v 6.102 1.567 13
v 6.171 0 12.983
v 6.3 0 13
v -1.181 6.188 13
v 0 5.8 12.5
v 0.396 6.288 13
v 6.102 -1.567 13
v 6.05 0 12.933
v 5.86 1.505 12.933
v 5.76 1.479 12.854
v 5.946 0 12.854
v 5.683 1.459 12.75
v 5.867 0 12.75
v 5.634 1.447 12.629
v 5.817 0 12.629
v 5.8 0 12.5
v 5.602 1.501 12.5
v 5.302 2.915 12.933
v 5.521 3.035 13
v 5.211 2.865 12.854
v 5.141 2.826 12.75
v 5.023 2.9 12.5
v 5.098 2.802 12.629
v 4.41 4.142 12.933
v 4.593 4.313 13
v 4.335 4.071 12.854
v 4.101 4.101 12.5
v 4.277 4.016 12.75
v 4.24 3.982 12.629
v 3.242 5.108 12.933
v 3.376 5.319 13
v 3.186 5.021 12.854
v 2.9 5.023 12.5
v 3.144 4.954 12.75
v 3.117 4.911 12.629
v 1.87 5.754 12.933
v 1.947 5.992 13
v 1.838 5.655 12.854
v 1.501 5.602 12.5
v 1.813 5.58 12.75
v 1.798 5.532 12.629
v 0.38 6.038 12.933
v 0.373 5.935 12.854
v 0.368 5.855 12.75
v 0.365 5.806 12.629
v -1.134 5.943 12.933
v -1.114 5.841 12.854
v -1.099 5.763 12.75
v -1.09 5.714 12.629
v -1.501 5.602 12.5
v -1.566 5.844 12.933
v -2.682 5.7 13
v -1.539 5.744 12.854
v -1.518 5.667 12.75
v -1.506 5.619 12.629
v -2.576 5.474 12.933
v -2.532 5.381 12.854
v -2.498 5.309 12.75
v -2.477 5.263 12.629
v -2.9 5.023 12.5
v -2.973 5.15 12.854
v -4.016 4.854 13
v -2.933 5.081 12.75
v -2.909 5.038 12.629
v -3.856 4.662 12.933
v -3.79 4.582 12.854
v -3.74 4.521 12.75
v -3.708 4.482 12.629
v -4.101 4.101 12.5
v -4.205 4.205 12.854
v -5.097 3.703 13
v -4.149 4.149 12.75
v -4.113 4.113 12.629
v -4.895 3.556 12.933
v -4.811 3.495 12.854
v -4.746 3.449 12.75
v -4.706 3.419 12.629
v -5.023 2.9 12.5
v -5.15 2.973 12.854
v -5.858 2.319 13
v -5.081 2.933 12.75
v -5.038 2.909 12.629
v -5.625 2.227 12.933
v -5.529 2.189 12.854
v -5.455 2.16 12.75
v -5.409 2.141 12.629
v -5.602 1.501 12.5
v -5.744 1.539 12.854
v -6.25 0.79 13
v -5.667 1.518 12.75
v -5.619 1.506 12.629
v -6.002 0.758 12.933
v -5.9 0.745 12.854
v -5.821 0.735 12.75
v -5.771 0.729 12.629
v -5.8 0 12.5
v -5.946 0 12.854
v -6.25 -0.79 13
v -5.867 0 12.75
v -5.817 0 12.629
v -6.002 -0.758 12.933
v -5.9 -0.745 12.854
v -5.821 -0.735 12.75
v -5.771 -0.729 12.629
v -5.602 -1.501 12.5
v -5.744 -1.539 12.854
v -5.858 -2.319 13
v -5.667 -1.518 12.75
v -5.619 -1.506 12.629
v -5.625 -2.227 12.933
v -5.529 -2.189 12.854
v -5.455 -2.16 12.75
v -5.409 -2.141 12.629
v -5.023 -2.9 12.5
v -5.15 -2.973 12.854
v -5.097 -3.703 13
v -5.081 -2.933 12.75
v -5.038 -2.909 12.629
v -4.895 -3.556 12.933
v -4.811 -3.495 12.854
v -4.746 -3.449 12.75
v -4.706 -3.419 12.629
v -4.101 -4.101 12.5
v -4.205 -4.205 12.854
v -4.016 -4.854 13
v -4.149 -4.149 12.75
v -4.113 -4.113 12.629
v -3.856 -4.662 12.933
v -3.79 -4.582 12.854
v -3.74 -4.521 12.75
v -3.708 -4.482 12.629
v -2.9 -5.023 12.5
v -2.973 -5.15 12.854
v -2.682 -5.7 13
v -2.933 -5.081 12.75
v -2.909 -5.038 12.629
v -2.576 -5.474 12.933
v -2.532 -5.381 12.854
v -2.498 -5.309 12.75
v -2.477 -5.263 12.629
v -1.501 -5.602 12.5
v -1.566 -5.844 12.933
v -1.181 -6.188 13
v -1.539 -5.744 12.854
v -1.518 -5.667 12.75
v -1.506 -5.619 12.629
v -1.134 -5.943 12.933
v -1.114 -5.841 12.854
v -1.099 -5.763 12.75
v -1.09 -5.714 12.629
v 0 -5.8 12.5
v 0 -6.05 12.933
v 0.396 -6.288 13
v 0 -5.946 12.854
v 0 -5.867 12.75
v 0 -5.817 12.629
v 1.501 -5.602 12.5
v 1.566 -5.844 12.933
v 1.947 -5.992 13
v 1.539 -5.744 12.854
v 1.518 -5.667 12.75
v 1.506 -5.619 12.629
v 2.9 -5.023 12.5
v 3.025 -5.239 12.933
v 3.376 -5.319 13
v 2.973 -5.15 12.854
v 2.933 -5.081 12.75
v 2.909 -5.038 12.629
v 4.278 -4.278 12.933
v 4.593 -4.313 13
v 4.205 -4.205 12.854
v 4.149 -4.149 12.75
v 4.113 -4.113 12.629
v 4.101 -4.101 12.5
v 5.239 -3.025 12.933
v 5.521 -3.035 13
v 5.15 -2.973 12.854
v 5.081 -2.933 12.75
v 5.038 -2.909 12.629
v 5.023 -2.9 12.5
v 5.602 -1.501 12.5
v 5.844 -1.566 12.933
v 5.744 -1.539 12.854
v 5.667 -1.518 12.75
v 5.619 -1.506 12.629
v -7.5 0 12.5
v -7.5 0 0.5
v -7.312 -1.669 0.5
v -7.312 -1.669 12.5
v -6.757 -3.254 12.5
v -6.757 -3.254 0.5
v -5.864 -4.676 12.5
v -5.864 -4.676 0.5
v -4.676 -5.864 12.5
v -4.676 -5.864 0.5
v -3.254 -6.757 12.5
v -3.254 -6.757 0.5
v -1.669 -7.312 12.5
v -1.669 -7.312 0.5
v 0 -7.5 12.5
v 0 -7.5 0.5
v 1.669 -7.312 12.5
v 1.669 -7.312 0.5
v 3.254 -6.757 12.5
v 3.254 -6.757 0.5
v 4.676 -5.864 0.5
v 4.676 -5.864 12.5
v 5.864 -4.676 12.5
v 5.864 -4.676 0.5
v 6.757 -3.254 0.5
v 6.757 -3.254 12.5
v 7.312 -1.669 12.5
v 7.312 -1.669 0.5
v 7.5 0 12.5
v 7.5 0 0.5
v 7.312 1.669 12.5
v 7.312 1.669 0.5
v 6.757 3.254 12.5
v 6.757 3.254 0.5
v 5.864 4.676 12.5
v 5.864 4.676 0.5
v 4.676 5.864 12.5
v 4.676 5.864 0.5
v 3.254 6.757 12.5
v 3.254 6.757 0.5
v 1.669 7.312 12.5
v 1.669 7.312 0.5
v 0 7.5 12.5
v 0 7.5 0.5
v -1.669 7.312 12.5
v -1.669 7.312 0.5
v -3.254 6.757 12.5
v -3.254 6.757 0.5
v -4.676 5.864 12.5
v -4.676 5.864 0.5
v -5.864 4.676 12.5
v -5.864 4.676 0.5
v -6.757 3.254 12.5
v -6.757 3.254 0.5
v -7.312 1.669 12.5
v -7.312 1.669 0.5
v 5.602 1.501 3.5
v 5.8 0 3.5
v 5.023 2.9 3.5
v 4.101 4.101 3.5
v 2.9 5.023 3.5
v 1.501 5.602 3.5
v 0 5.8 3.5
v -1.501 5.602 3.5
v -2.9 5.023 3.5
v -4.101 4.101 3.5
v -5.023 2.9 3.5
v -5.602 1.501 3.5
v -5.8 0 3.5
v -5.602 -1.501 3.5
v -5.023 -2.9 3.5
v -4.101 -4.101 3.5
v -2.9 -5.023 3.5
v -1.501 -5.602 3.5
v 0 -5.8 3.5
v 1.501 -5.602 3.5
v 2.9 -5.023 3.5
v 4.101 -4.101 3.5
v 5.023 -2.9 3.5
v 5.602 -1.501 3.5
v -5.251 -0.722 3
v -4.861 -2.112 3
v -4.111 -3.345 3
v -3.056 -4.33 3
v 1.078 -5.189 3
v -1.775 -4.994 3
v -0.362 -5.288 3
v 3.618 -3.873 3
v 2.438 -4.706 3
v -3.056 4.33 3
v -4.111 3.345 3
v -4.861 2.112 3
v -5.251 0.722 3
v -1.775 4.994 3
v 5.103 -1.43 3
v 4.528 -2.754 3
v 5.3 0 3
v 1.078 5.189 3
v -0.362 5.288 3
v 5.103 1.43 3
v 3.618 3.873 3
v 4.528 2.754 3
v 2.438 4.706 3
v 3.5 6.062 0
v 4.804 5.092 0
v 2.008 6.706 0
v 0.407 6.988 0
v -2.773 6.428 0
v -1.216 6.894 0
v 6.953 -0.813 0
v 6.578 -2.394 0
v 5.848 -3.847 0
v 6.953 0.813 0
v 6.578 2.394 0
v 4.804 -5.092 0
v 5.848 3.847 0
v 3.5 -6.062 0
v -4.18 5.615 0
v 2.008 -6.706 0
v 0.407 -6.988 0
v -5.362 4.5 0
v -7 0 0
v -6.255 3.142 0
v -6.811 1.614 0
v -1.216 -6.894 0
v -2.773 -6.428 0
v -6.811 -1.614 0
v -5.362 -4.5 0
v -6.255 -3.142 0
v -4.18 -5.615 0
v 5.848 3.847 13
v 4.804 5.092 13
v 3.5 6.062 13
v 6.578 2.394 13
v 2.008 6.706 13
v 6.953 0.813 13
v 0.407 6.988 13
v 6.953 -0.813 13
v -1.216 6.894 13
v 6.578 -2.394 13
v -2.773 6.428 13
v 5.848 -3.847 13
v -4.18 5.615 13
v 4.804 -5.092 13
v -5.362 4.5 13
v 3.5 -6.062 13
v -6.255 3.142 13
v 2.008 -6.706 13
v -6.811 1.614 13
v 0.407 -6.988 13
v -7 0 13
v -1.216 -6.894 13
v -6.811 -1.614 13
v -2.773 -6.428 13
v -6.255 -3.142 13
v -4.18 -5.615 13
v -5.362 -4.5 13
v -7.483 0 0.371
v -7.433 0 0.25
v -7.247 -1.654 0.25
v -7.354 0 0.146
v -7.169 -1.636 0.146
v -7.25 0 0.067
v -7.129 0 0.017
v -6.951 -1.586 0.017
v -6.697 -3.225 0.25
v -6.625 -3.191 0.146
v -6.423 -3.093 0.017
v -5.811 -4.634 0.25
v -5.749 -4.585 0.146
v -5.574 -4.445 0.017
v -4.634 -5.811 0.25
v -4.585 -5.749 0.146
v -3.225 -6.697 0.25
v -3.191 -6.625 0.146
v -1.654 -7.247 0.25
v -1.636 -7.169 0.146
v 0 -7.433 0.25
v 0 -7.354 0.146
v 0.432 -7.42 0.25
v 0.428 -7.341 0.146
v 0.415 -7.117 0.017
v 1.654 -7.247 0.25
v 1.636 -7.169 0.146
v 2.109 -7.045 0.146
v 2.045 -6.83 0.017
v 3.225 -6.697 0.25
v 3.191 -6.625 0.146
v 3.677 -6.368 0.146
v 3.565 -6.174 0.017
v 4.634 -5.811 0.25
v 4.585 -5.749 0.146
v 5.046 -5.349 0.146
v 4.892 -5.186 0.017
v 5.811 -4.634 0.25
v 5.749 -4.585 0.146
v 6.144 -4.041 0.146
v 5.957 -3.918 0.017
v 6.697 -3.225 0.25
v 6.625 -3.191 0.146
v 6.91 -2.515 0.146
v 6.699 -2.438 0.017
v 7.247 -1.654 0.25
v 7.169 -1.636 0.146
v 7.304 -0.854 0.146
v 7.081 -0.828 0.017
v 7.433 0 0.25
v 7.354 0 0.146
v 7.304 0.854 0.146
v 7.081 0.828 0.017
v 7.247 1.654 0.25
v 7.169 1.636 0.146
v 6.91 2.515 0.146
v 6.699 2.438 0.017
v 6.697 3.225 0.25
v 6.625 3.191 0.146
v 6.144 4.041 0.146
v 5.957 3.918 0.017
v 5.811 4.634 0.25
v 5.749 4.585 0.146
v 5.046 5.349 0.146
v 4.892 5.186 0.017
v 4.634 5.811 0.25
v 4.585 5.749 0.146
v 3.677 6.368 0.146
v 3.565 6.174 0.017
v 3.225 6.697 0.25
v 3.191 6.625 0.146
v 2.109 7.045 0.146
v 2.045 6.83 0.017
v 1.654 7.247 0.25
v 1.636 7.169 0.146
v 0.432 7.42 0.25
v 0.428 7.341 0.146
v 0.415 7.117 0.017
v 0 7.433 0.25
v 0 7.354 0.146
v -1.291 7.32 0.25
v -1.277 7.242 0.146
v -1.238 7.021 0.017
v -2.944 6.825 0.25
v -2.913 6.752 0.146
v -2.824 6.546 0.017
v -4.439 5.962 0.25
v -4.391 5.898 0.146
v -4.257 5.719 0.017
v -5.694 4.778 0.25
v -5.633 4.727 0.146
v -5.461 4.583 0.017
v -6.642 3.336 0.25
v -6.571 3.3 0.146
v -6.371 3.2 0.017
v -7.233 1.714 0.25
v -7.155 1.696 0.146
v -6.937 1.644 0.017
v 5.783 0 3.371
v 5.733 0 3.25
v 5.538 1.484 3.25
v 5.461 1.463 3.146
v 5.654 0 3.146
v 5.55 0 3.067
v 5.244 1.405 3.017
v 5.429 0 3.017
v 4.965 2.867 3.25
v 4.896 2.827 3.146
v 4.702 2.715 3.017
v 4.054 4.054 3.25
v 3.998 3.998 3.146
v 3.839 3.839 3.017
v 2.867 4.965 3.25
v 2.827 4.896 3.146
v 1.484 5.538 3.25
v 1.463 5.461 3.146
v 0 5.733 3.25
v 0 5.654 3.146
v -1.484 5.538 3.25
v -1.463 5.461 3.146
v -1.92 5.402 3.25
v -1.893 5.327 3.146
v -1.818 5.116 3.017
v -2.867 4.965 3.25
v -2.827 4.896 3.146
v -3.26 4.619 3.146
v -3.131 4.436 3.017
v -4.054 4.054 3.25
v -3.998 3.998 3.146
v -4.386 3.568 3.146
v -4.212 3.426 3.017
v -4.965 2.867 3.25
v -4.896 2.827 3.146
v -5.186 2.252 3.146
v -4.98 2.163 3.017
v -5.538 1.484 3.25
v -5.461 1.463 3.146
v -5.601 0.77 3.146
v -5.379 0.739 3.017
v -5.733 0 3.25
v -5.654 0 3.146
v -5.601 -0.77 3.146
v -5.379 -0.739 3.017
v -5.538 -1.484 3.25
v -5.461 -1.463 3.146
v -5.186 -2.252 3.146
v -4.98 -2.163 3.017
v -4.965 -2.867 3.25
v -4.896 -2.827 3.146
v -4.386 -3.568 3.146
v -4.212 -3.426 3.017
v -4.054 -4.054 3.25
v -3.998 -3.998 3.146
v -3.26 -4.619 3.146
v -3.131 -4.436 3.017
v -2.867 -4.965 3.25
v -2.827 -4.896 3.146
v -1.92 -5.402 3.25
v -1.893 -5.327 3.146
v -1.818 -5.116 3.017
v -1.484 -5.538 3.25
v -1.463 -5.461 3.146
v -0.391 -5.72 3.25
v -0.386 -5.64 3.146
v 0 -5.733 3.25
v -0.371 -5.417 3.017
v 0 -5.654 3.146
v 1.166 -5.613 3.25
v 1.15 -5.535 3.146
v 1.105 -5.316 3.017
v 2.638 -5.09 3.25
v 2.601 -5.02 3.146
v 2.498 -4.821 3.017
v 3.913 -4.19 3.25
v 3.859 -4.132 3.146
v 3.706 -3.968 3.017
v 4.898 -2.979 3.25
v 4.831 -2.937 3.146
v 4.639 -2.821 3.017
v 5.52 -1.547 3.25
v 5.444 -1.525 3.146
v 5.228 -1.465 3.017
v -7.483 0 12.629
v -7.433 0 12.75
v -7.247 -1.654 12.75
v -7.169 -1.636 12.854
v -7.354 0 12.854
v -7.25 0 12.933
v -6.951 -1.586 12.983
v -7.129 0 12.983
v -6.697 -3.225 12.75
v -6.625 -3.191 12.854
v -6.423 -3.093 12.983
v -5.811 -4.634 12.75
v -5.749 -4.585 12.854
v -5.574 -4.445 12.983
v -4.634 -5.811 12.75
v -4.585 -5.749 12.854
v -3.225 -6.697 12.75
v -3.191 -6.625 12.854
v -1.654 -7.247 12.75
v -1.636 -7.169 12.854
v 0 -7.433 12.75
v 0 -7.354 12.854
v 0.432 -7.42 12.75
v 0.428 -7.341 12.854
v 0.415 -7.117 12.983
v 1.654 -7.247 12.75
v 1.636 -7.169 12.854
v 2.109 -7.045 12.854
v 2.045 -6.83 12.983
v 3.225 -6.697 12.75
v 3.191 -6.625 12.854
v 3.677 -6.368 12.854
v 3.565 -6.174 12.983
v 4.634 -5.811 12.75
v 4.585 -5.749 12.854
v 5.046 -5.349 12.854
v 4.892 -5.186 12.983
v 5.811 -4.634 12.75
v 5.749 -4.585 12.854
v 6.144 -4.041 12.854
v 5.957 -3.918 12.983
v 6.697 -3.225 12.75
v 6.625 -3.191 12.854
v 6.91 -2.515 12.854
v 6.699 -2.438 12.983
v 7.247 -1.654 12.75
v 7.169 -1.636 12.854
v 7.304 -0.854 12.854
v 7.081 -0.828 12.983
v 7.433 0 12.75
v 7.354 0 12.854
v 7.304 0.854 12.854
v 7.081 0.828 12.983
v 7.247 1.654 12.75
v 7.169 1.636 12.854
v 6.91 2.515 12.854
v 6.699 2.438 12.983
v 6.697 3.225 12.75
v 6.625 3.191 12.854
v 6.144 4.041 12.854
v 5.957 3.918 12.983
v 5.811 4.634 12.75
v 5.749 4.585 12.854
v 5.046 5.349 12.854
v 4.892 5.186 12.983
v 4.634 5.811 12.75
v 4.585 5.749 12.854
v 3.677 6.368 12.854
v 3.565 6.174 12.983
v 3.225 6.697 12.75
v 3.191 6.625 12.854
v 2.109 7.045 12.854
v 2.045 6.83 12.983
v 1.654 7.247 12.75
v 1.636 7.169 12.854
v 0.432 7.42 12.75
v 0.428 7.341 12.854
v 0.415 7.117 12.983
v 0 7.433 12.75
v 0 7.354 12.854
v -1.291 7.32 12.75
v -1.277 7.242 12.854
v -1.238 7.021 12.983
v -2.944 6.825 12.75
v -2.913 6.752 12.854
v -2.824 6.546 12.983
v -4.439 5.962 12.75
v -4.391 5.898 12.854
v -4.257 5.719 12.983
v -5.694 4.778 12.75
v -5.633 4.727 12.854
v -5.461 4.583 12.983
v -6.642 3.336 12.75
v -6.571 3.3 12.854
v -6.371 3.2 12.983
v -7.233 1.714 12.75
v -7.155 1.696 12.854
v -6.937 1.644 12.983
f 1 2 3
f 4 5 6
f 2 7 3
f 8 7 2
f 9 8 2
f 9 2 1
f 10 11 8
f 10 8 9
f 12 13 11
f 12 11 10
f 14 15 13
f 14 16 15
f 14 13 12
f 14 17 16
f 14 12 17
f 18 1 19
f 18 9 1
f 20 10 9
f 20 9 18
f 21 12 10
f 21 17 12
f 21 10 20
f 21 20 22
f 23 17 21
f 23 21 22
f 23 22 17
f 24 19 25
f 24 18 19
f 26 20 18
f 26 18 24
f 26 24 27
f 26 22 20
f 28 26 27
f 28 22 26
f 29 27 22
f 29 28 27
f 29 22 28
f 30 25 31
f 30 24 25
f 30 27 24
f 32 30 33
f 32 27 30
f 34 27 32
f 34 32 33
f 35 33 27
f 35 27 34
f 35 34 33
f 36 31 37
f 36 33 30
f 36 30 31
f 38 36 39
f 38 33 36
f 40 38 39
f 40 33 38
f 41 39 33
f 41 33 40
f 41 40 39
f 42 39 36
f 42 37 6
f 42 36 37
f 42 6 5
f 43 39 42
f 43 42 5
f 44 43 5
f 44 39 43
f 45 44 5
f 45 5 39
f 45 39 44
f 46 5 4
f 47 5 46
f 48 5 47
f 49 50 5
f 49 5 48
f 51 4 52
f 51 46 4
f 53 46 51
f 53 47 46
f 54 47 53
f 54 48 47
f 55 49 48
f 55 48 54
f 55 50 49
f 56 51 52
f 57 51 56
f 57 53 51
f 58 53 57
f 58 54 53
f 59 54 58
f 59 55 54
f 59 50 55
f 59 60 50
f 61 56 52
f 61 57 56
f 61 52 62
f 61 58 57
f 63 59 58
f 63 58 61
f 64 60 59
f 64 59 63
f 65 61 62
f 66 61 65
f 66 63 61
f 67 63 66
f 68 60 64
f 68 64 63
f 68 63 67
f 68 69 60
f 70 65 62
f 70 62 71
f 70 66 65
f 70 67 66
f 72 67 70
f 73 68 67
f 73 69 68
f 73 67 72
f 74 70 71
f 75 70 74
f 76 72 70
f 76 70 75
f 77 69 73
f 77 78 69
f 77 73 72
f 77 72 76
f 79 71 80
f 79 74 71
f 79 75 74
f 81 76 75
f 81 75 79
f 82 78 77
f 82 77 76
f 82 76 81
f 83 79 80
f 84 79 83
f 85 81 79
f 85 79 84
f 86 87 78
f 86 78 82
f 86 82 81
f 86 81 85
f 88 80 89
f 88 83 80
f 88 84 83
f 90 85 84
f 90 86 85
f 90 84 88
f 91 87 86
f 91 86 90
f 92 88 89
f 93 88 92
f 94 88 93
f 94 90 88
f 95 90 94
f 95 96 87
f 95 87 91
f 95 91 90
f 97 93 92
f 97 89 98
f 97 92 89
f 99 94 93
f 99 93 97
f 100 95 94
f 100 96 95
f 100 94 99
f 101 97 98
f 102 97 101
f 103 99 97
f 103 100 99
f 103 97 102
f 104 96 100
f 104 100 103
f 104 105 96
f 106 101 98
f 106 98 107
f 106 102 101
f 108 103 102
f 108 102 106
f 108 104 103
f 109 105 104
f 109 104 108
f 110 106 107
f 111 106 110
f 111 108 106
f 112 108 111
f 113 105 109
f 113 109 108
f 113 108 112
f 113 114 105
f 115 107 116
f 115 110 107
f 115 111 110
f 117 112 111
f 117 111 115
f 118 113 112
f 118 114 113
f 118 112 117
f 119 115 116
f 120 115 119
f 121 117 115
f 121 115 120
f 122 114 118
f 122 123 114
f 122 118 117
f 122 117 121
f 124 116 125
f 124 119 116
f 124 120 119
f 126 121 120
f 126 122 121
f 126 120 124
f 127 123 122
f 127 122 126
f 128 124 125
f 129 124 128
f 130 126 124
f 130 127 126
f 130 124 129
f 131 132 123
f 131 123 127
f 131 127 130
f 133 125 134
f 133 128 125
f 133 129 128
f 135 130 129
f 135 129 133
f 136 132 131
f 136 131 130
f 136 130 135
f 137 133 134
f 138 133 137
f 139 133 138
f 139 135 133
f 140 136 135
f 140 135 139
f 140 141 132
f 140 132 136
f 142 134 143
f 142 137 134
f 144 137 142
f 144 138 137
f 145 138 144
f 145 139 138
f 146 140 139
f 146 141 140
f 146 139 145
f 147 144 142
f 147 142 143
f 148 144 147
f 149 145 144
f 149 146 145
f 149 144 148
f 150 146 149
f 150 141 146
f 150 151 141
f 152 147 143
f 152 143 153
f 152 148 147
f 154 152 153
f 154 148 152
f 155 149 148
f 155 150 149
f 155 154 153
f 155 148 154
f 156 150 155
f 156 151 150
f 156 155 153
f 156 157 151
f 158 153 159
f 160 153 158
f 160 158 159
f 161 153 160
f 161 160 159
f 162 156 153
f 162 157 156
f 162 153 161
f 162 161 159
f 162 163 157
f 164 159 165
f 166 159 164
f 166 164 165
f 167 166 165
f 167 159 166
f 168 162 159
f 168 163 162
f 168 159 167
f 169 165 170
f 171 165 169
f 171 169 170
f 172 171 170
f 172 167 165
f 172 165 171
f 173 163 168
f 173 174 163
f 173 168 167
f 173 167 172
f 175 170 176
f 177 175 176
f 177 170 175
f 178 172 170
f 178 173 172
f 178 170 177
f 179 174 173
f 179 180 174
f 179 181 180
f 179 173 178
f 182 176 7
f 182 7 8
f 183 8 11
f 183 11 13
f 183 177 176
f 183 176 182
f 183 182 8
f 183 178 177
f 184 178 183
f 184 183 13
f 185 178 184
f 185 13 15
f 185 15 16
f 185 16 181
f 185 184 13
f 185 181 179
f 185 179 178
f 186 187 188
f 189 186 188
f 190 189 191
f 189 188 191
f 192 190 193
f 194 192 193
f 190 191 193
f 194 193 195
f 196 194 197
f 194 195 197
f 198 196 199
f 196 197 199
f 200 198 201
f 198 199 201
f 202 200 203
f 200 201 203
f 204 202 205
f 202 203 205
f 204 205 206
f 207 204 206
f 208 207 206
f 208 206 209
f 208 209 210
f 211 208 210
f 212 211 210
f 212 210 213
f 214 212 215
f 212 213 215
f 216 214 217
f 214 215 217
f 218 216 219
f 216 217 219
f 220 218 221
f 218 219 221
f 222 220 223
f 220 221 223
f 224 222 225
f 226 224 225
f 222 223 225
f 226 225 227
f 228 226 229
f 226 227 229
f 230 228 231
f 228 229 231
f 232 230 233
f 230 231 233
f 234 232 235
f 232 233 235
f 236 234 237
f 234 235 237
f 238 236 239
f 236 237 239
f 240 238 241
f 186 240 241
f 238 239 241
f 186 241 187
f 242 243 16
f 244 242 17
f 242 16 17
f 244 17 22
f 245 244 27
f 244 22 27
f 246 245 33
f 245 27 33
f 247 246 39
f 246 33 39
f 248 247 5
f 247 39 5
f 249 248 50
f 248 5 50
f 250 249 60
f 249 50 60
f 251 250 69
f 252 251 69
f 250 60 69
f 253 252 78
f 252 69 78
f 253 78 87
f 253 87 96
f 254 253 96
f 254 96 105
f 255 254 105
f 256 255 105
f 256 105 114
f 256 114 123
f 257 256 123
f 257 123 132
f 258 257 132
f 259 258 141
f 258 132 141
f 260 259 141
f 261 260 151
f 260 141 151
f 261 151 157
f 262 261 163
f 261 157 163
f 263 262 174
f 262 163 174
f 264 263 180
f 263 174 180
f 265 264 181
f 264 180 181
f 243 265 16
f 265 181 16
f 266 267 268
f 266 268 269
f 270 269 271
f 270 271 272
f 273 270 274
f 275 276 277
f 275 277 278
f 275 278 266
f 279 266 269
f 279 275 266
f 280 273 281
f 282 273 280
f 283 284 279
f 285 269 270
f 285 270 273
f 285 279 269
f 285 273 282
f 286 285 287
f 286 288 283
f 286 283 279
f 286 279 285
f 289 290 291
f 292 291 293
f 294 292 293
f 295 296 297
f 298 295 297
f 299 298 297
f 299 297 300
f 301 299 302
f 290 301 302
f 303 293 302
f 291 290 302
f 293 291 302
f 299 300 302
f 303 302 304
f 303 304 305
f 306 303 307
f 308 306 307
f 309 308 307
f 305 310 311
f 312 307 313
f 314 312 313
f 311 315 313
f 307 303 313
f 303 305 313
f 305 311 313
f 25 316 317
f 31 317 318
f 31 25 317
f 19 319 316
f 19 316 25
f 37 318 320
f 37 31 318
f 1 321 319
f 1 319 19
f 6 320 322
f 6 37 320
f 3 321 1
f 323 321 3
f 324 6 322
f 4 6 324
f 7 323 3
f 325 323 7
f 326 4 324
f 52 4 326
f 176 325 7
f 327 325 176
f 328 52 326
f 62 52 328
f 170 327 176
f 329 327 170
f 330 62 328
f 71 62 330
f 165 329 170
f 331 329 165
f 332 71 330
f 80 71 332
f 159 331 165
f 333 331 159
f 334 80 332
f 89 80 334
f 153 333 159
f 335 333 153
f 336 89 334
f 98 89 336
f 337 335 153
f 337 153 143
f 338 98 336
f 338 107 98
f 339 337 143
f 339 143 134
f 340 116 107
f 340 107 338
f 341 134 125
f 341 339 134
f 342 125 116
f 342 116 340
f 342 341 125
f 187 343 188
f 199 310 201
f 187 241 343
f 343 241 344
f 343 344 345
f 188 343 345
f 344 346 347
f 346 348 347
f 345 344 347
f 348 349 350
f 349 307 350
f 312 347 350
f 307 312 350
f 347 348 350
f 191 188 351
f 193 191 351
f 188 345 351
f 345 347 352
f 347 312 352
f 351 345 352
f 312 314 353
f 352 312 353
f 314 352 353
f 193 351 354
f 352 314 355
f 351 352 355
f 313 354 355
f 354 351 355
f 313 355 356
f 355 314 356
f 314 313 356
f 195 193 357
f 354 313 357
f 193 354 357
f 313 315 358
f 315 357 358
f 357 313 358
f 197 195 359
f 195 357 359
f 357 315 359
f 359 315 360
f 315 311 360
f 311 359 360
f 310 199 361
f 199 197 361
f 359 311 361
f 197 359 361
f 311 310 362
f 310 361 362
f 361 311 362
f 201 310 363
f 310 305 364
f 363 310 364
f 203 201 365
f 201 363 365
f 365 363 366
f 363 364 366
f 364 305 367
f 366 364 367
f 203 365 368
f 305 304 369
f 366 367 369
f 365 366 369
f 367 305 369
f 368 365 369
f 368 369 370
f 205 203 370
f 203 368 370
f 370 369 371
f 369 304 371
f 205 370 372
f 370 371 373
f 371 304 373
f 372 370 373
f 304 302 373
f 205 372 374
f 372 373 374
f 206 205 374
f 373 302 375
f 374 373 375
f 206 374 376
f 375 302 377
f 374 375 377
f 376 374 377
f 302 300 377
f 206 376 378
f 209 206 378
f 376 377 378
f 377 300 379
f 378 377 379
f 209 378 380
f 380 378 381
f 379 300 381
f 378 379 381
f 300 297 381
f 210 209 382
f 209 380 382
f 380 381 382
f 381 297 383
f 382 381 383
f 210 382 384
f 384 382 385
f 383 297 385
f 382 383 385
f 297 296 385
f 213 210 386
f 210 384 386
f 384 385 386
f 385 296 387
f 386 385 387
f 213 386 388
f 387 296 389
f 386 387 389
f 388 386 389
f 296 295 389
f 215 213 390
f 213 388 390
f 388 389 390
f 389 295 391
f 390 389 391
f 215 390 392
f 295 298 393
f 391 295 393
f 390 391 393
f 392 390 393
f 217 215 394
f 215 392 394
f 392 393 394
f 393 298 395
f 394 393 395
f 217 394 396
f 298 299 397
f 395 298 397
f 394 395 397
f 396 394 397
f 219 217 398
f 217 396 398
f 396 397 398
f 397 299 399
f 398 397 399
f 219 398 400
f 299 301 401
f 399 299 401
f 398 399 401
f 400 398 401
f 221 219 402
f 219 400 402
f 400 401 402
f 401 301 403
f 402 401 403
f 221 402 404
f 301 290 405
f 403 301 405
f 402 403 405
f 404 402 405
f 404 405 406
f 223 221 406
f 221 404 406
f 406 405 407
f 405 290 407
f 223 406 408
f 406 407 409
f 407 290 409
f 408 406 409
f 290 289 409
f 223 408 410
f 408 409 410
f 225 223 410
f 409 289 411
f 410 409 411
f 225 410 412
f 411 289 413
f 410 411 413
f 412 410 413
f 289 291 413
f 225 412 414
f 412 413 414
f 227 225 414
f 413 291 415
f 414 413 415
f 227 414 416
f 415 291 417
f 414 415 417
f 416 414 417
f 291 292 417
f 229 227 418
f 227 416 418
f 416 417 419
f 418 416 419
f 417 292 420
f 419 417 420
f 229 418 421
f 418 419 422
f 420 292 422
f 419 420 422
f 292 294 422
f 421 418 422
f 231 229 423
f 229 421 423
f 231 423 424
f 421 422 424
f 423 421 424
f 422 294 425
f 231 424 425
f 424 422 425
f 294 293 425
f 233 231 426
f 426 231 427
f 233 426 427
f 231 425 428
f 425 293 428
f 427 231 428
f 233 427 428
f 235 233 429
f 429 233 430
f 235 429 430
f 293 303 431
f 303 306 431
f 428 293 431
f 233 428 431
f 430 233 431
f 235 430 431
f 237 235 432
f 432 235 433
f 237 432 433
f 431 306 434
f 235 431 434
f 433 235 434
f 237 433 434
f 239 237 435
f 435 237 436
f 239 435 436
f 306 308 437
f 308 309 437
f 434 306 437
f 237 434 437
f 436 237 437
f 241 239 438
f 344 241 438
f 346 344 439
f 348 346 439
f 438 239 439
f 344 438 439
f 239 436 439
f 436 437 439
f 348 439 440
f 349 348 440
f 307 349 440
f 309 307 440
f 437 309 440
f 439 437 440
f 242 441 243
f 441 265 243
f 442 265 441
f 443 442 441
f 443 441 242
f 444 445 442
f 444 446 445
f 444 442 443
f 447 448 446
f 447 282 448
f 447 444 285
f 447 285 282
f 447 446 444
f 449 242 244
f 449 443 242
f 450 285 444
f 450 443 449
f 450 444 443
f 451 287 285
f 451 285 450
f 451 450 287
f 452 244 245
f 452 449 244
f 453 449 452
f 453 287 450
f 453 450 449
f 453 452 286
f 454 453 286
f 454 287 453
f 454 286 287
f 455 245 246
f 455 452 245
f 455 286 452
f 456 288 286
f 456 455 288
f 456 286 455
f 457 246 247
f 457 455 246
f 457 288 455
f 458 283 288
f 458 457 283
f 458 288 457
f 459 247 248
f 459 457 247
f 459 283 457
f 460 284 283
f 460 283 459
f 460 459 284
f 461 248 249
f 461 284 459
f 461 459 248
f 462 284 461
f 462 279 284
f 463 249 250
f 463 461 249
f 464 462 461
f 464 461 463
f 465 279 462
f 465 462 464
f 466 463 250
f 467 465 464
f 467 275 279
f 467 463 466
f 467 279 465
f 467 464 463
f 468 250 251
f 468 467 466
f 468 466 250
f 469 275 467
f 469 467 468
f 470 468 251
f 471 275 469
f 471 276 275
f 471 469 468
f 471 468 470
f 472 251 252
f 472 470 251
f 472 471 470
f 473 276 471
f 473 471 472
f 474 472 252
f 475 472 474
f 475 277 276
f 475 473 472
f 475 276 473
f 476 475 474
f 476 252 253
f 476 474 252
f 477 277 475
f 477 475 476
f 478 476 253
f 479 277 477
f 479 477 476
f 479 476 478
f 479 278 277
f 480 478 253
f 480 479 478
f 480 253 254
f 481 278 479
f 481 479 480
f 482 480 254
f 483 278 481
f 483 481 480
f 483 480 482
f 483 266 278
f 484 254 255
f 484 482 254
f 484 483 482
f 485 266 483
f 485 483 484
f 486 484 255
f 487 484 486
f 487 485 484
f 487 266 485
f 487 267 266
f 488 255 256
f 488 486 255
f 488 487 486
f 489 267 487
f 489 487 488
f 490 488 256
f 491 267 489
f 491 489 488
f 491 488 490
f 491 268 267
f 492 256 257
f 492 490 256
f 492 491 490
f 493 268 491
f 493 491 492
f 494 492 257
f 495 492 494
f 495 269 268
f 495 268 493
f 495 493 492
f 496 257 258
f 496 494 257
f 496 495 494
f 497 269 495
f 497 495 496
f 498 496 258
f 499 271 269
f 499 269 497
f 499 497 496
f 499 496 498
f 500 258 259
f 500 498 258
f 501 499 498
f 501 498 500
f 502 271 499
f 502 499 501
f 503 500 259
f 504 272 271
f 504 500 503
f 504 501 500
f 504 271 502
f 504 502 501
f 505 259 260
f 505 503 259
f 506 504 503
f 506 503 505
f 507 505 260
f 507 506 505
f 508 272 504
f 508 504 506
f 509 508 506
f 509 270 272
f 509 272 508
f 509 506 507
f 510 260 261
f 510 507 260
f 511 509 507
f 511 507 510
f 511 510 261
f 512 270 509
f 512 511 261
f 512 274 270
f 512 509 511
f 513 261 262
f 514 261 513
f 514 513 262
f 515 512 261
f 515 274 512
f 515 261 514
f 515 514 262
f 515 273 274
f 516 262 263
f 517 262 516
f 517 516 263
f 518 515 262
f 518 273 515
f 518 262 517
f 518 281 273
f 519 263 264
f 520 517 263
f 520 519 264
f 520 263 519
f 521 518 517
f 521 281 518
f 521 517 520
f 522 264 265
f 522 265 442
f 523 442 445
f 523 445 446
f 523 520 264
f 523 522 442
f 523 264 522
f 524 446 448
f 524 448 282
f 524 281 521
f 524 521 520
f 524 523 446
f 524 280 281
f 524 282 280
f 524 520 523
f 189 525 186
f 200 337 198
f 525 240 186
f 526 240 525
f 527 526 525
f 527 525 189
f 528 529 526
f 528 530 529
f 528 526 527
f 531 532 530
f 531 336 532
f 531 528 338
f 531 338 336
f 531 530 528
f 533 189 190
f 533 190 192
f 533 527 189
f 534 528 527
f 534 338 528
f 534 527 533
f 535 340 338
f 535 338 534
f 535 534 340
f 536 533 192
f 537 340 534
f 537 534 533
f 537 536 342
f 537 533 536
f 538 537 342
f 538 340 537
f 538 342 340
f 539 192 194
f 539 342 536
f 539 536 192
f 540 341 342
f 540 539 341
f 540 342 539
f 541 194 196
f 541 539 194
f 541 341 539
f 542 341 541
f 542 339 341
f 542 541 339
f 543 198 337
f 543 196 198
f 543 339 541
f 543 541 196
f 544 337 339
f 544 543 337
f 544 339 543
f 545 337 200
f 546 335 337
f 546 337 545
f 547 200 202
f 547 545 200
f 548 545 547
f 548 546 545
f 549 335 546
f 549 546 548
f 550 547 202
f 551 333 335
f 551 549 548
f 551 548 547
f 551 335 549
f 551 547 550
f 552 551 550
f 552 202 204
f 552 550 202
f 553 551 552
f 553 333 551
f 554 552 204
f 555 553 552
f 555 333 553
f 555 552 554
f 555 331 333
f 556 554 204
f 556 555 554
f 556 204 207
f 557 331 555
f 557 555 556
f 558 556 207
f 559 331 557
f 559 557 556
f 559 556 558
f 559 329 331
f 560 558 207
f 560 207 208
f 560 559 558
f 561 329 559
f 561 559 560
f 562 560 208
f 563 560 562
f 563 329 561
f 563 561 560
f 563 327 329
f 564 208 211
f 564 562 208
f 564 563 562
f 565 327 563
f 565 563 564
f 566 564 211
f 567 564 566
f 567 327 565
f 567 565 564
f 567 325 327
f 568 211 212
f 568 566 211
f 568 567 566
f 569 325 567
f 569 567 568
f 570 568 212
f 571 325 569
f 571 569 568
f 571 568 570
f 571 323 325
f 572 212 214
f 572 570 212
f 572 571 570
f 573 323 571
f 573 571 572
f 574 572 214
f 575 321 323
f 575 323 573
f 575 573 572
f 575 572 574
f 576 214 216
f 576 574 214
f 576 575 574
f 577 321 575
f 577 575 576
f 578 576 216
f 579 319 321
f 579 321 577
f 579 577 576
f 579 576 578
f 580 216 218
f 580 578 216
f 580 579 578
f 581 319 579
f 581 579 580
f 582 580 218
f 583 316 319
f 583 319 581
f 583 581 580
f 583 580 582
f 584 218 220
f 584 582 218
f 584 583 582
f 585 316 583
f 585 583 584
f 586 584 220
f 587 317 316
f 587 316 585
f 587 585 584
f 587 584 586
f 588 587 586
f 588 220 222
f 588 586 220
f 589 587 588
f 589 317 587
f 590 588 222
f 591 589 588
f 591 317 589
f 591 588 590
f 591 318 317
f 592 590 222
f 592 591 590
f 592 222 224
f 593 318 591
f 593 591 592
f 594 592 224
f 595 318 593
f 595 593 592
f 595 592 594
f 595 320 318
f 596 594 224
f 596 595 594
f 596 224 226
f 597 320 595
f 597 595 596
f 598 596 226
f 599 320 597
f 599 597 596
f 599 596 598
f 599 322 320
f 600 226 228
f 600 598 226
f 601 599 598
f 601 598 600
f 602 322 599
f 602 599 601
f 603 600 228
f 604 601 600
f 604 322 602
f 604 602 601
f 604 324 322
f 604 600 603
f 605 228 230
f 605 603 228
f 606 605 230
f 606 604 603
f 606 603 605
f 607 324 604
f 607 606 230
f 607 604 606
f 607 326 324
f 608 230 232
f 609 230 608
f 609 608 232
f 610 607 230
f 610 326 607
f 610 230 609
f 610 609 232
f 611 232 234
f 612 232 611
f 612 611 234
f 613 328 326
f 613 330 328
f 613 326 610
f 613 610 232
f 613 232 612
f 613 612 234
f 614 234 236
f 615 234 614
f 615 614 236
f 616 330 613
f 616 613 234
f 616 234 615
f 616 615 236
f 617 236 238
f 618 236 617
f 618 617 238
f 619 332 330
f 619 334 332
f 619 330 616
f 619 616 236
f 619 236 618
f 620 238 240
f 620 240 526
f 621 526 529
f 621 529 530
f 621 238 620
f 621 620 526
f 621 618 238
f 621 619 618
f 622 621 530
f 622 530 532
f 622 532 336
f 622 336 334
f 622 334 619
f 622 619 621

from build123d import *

# Parameters (mm, degrees)
SKETCH1_R           = 7.5
BOSS_EXTRUDE1_DEPTH = 13
SKETCH3_R           = 5.8
CUT_EXTRUDE1_DEPTH  = 10
FILLET1_R           = 0.5


with BuildPart() as part:
    # Sketch1 → Boss-Extrude1 (new body)
    with BuildSketch(Plane.XY):
        with Locations(Location((0, 0, 0), (0, 0, 180))):
            Circle(SKETCH1_R)
    extrude(amount=BOSS_EXTRUDE1_DEPTH)

    # Sketch3 → Cut-Extrude1 (cut)
    with BuildSketch(Plane.XY.offset(13)):
        Circle(SKETCH3_R)
    extrude(amount=-CUT_EXTRUDE1_DEPTH, mode=Mode.SUBTRACT)

    # Fillet1
    fillet1_edges = [part.edges().sort_by_distance(p)[0] for p in [
        (7.5, 0, 0),
        (7.5, 0, 13),
        (-5.8, 0, 3),
        (-5.8, 0, 13),
    ]]
    fillet(fillet1_edges, radius=FILLET1_R)


solid = part.part
